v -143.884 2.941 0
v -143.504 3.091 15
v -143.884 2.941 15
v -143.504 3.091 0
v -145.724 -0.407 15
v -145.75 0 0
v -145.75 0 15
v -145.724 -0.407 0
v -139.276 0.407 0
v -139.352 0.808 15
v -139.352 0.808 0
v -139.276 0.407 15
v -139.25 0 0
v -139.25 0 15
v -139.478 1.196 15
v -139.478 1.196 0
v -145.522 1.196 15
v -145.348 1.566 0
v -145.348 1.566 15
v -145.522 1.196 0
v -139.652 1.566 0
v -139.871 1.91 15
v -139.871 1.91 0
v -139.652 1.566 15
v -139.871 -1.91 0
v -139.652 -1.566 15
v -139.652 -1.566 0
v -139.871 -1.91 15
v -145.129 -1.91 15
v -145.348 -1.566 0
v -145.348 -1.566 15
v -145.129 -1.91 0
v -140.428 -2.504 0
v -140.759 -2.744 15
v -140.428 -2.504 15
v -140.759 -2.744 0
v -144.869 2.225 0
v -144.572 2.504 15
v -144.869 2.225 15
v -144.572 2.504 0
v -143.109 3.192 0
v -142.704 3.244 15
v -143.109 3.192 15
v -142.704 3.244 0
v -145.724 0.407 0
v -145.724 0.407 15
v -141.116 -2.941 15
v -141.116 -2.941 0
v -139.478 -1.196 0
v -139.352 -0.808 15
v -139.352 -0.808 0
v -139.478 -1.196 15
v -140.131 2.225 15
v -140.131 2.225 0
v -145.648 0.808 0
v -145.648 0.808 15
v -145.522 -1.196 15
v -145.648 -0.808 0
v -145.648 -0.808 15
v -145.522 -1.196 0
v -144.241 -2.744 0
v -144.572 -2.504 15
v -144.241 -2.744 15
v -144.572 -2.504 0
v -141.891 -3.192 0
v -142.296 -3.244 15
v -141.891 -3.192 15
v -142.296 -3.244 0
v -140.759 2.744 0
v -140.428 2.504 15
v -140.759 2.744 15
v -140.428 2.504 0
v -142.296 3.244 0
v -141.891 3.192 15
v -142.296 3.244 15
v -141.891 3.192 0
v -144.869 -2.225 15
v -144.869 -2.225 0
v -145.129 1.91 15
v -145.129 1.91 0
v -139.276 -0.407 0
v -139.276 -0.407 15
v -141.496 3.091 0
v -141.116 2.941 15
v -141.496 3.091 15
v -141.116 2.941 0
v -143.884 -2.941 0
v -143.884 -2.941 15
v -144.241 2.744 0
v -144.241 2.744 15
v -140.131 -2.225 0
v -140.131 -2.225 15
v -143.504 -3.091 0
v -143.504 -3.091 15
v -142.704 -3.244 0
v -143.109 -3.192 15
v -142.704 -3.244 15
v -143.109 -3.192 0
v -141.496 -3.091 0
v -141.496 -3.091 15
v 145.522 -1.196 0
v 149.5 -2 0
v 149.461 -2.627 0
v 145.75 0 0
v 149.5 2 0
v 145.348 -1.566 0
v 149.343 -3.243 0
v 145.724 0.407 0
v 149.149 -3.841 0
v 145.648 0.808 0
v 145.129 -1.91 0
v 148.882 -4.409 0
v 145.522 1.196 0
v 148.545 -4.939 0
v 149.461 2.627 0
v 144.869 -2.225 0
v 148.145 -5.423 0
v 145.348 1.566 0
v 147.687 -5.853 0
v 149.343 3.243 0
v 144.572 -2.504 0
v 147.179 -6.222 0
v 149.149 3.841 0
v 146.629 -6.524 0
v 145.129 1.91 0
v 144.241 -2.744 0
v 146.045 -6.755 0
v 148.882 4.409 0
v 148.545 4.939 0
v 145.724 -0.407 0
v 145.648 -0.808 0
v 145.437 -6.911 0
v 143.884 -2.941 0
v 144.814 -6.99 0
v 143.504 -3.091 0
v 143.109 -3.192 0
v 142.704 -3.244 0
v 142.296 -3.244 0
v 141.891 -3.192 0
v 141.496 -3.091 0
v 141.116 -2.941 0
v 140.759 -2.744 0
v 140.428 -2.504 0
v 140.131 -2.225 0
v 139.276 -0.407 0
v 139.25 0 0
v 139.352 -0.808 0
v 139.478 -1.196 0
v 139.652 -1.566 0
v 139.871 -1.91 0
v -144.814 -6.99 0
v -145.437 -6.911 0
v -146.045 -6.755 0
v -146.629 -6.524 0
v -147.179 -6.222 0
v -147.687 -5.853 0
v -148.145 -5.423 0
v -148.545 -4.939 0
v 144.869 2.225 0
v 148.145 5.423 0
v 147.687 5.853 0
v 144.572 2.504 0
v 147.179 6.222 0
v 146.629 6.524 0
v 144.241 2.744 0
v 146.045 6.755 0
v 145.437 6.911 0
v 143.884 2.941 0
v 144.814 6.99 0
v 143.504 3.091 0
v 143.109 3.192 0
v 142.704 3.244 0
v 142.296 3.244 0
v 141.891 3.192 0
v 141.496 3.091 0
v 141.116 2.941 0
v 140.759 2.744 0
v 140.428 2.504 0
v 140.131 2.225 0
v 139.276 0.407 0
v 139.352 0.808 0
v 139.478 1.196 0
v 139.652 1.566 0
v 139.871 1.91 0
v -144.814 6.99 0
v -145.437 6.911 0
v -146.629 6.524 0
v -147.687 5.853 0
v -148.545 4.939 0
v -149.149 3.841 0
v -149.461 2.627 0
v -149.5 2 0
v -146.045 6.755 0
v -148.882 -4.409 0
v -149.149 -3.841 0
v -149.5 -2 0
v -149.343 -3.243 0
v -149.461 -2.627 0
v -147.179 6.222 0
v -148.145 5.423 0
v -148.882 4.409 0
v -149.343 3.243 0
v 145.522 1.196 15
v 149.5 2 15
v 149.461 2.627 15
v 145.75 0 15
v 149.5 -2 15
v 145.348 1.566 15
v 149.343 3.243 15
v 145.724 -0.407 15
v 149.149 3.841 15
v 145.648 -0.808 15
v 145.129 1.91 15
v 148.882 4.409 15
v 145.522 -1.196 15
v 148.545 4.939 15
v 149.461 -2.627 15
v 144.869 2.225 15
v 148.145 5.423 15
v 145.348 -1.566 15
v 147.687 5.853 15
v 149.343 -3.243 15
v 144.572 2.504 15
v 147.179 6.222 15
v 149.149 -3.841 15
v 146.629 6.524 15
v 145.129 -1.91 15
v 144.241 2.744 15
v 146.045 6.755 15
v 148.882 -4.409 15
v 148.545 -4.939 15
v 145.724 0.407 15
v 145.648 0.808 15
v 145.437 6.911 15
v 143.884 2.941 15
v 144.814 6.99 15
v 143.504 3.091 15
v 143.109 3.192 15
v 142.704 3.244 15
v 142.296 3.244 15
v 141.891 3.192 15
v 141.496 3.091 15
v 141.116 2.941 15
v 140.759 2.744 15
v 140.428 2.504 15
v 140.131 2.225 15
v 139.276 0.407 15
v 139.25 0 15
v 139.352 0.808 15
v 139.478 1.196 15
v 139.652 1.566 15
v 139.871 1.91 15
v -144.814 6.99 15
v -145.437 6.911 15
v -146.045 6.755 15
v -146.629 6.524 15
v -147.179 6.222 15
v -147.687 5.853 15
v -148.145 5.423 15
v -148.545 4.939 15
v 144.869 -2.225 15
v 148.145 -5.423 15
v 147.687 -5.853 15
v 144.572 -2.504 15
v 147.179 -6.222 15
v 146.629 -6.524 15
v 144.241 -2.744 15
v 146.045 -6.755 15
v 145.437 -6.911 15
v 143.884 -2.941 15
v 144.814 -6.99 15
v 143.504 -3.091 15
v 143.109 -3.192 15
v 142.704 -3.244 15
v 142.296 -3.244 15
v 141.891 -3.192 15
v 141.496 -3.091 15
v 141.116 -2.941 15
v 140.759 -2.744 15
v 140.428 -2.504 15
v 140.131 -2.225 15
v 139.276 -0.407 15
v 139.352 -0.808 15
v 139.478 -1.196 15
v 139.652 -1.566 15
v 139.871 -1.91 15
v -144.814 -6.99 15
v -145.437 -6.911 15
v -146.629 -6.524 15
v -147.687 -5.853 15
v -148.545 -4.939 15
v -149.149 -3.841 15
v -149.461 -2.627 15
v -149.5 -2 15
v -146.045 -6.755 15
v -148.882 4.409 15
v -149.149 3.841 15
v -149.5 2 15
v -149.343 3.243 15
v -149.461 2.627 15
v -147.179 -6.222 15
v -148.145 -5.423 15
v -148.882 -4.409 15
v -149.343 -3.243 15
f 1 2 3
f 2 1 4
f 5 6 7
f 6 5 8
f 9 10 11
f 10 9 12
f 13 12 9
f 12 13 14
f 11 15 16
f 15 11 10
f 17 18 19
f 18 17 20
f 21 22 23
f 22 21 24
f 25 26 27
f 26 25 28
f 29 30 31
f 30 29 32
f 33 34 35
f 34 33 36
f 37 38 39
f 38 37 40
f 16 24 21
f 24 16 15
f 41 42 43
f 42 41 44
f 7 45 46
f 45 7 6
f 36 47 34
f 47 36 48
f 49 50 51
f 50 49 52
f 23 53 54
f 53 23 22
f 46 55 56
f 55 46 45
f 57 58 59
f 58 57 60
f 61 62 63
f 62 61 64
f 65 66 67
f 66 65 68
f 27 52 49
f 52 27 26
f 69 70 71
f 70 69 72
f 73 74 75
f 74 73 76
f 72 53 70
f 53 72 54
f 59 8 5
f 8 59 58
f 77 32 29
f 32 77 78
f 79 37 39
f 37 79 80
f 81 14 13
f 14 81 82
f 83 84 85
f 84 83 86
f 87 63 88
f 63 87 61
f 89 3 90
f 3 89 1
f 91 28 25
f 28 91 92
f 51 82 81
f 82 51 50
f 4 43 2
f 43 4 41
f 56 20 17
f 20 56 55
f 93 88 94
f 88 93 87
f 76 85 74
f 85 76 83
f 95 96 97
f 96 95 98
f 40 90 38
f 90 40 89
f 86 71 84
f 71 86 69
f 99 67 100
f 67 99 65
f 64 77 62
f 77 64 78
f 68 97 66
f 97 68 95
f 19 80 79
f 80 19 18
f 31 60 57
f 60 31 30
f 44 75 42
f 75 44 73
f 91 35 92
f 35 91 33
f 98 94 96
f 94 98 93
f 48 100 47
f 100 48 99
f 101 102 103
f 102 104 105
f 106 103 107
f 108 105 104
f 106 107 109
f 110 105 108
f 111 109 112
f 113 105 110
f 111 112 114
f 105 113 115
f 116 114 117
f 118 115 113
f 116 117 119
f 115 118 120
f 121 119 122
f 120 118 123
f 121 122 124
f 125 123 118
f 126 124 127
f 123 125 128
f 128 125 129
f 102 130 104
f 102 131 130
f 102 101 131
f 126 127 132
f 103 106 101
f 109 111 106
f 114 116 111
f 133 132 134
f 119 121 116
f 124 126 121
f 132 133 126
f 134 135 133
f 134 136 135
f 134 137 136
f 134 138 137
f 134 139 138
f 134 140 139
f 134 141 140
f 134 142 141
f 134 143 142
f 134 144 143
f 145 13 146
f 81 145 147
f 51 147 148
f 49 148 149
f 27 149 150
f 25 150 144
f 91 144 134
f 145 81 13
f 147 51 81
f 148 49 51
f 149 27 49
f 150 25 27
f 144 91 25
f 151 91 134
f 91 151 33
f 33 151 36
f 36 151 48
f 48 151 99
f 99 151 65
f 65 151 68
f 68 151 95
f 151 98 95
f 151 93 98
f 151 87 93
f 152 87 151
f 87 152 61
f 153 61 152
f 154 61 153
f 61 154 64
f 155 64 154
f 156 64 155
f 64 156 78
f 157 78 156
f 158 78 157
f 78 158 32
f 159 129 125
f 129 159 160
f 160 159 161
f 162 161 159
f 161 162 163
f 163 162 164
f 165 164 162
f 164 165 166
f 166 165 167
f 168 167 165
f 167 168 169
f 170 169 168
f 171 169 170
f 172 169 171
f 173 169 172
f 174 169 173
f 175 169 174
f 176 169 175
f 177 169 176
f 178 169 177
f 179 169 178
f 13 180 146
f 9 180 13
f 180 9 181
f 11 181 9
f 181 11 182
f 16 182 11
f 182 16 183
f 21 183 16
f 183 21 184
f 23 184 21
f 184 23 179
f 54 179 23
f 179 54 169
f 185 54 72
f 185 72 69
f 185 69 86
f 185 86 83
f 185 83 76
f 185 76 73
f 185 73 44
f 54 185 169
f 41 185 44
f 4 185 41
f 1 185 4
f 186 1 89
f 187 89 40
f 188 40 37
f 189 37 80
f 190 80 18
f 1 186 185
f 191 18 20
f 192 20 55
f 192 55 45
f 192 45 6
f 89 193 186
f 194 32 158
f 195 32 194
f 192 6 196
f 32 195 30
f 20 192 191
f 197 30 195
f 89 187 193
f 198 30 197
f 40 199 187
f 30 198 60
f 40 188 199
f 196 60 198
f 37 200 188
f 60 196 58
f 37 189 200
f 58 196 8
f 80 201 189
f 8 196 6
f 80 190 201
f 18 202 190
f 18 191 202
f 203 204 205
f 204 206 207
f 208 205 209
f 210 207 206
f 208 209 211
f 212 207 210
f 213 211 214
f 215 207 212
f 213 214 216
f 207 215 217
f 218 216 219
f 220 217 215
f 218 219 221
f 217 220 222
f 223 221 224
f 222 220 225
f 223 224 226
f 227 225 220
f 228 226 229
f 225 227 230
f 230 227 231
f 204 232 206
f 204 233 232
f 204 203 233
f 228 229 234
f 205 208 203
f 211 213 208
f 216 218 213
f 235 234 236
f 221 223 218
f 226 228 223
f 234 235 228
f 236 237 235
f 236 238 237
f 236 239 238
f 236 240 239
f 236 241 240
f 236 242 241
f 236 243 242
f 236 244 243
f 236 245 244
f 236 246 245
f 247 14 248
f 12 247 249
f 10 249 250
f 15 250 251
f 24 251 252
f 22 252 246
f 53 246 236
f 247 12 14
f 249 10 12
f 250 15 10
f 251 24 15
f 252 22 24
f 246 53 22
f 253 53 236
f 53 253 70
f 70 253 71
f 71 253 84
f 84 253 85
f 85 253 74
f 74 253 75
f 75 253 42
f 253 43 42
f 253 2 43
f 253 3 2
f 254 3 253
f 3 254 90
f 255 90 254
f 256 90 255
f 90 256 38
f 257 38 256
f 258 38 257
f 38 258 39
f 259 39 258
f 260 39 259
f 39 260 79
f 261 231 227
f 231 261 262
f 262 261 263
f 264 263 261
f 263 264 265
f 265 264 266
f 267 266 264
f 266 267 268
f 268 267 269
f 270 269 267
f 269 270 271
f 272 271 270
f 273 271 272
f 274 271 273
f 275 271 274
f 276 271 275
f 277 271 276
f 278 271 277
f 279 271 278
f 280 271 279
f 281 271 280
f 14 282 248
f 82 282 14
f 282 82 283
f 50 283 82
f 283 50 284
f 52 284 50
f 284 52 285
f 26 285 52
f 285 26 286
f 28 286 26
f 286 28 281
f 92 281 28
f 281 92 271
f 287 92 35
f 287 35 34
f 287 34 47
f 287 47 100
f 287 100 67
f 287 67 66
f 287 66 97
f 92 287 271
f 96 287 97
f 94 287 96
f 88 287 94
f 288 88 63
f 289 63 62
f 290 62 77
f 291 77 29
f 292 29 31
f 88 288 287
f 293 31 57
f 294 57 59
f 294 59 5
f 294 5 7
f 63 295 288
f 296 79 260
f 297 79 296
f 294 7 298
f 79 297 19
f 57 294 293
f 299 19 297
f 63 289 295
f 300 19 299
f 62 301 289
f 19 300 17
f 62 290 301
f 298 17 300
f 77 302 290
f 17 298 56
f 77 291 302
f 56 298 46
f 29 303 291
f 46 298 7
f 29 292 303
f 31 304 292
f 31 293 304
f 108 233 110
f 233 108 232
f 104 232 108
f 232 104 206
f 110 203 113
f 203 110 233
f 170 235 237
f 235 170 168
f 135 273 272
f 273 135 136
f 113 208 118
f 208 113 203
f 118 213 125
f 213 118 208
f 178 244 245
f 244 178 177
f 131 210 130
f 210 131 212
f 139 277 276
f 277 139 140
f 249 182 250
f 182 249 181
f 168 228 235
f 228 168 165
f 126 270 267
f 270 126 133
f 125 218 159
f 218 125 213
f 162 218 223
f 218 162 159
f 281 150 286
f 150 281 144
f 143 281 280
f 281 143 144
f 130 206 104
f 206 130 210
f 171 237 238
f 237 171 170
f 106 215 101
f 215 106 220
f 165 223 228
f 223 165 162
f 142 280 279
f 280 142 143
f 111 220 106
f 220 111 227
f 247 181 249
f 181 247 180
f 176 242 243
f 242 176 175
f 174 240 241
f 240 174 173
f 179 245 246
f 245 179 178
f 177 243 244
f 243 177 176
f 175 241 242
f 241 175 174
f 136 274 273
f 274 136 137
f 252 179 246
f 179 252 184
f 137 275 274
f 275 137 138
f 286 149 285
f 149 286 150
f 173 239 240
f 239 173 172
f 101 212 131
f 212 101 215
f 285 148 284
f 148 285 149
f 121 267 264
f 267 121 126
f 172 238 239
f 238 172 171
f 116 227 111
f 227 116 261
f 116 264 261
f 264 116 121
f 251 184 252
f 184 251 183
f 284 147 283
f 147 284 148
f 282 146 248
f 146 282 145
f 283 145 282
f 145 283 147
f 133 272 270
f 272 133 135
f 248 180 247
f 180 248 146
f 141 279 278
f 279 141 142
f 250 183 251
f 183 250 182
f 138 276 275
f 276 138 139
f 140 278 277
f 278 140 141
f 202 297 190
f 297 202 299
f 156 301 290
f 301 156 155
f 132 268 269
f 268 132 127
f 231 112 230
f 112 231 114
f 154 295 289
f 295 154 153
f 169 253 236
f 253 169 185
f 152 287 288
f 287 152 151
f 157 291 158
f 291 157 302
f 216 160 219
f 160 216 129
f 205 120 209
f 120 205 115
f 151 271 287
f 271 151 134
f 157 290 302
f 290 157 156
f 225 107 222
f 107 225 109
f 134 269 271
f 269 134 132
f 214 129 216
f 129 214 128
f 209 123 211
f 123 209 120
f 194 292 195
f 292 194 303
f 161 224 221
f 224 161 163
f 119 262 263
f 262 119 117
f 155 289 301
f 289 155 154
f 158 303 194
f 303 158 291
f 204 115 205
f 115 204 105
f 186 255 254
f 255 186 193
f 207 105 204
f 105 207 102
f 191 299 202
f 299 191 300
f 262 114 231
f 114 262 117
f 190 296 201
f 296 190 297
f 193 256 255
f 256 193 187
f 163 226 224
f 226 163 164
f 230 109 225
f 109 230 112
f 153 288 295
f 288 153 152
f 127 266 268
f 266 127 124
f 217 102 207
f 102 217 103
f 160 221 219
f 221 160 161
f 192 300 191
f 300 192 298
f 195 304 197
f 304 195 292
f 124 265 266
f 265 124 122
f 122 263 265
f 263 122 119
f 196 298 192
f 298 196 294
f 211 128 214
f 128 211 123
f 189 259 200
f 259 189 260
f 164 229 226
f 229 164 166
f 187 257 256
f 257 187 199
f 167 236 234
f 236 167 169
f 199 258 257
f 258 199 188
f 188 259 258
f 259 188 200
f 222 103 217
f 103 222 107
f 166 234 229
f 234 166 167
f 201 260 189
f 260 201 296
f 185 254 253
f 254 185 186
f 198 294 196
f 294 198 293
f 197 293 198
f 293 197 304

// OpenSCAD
$fn = 50;


difference() {
	union() {
		hull() {
			translate(v = [-144.5000000000, 2.0000000000, 0]) {
				cylinder(h = 15, r = 5);
			}
			translate(v = [144.5000000000, 2.0000000000, 0]) {
				cylinder(h = 15, r = 5);
			}
			translate(v = [-144.5000000000, -2.0000000000, 0]) {
				cylinder(h = 15, r = 5);
			}
			translate(v = [144.5000000000, -2.0000000000, 0]) {
				cylinder(h = 15, r = 5);
			}
		}
	}
	union() {
		translate(v = [-142.5000000000, 0.0000000000, 0]) {
			cylinder(h = 15, r = 3.2500000000);
		}
		translate(v = [142.5000000000, 0.0000000000, 0]) {
			cylinder(h = 15, r = 3.2500000000);
		}
		translate(v = [-142.5000000000, 0.0000000000, 0]) {
			cylinder(h = 15, r = 1.8000000000);
		}
		translate(v = [142.5000000000, 0.0000000000, 0]) {
			cylinder(h = 15, r = 1.8000000000);
		}
		translate(v = [-142.5000000000, 0.0000000000, 0]) {
			cylinder(h = 15, r = 1.8000000000);
		}
		translate(v = [142.5000000000, 0.0000000000, 0]) {
			cylinder(h = 15, r = 1.8000000000);
		}
		translate(v = [-142.5000000000, 0.0000000000, 0]) {
			cylinder(h = 15, r = 1.8000000000);
		}
		translate(v = [142.5000000000, 0.0000000000, 0]) {
			cylinder(h = 15, r = 1.8000000000);
		}
	}
}
